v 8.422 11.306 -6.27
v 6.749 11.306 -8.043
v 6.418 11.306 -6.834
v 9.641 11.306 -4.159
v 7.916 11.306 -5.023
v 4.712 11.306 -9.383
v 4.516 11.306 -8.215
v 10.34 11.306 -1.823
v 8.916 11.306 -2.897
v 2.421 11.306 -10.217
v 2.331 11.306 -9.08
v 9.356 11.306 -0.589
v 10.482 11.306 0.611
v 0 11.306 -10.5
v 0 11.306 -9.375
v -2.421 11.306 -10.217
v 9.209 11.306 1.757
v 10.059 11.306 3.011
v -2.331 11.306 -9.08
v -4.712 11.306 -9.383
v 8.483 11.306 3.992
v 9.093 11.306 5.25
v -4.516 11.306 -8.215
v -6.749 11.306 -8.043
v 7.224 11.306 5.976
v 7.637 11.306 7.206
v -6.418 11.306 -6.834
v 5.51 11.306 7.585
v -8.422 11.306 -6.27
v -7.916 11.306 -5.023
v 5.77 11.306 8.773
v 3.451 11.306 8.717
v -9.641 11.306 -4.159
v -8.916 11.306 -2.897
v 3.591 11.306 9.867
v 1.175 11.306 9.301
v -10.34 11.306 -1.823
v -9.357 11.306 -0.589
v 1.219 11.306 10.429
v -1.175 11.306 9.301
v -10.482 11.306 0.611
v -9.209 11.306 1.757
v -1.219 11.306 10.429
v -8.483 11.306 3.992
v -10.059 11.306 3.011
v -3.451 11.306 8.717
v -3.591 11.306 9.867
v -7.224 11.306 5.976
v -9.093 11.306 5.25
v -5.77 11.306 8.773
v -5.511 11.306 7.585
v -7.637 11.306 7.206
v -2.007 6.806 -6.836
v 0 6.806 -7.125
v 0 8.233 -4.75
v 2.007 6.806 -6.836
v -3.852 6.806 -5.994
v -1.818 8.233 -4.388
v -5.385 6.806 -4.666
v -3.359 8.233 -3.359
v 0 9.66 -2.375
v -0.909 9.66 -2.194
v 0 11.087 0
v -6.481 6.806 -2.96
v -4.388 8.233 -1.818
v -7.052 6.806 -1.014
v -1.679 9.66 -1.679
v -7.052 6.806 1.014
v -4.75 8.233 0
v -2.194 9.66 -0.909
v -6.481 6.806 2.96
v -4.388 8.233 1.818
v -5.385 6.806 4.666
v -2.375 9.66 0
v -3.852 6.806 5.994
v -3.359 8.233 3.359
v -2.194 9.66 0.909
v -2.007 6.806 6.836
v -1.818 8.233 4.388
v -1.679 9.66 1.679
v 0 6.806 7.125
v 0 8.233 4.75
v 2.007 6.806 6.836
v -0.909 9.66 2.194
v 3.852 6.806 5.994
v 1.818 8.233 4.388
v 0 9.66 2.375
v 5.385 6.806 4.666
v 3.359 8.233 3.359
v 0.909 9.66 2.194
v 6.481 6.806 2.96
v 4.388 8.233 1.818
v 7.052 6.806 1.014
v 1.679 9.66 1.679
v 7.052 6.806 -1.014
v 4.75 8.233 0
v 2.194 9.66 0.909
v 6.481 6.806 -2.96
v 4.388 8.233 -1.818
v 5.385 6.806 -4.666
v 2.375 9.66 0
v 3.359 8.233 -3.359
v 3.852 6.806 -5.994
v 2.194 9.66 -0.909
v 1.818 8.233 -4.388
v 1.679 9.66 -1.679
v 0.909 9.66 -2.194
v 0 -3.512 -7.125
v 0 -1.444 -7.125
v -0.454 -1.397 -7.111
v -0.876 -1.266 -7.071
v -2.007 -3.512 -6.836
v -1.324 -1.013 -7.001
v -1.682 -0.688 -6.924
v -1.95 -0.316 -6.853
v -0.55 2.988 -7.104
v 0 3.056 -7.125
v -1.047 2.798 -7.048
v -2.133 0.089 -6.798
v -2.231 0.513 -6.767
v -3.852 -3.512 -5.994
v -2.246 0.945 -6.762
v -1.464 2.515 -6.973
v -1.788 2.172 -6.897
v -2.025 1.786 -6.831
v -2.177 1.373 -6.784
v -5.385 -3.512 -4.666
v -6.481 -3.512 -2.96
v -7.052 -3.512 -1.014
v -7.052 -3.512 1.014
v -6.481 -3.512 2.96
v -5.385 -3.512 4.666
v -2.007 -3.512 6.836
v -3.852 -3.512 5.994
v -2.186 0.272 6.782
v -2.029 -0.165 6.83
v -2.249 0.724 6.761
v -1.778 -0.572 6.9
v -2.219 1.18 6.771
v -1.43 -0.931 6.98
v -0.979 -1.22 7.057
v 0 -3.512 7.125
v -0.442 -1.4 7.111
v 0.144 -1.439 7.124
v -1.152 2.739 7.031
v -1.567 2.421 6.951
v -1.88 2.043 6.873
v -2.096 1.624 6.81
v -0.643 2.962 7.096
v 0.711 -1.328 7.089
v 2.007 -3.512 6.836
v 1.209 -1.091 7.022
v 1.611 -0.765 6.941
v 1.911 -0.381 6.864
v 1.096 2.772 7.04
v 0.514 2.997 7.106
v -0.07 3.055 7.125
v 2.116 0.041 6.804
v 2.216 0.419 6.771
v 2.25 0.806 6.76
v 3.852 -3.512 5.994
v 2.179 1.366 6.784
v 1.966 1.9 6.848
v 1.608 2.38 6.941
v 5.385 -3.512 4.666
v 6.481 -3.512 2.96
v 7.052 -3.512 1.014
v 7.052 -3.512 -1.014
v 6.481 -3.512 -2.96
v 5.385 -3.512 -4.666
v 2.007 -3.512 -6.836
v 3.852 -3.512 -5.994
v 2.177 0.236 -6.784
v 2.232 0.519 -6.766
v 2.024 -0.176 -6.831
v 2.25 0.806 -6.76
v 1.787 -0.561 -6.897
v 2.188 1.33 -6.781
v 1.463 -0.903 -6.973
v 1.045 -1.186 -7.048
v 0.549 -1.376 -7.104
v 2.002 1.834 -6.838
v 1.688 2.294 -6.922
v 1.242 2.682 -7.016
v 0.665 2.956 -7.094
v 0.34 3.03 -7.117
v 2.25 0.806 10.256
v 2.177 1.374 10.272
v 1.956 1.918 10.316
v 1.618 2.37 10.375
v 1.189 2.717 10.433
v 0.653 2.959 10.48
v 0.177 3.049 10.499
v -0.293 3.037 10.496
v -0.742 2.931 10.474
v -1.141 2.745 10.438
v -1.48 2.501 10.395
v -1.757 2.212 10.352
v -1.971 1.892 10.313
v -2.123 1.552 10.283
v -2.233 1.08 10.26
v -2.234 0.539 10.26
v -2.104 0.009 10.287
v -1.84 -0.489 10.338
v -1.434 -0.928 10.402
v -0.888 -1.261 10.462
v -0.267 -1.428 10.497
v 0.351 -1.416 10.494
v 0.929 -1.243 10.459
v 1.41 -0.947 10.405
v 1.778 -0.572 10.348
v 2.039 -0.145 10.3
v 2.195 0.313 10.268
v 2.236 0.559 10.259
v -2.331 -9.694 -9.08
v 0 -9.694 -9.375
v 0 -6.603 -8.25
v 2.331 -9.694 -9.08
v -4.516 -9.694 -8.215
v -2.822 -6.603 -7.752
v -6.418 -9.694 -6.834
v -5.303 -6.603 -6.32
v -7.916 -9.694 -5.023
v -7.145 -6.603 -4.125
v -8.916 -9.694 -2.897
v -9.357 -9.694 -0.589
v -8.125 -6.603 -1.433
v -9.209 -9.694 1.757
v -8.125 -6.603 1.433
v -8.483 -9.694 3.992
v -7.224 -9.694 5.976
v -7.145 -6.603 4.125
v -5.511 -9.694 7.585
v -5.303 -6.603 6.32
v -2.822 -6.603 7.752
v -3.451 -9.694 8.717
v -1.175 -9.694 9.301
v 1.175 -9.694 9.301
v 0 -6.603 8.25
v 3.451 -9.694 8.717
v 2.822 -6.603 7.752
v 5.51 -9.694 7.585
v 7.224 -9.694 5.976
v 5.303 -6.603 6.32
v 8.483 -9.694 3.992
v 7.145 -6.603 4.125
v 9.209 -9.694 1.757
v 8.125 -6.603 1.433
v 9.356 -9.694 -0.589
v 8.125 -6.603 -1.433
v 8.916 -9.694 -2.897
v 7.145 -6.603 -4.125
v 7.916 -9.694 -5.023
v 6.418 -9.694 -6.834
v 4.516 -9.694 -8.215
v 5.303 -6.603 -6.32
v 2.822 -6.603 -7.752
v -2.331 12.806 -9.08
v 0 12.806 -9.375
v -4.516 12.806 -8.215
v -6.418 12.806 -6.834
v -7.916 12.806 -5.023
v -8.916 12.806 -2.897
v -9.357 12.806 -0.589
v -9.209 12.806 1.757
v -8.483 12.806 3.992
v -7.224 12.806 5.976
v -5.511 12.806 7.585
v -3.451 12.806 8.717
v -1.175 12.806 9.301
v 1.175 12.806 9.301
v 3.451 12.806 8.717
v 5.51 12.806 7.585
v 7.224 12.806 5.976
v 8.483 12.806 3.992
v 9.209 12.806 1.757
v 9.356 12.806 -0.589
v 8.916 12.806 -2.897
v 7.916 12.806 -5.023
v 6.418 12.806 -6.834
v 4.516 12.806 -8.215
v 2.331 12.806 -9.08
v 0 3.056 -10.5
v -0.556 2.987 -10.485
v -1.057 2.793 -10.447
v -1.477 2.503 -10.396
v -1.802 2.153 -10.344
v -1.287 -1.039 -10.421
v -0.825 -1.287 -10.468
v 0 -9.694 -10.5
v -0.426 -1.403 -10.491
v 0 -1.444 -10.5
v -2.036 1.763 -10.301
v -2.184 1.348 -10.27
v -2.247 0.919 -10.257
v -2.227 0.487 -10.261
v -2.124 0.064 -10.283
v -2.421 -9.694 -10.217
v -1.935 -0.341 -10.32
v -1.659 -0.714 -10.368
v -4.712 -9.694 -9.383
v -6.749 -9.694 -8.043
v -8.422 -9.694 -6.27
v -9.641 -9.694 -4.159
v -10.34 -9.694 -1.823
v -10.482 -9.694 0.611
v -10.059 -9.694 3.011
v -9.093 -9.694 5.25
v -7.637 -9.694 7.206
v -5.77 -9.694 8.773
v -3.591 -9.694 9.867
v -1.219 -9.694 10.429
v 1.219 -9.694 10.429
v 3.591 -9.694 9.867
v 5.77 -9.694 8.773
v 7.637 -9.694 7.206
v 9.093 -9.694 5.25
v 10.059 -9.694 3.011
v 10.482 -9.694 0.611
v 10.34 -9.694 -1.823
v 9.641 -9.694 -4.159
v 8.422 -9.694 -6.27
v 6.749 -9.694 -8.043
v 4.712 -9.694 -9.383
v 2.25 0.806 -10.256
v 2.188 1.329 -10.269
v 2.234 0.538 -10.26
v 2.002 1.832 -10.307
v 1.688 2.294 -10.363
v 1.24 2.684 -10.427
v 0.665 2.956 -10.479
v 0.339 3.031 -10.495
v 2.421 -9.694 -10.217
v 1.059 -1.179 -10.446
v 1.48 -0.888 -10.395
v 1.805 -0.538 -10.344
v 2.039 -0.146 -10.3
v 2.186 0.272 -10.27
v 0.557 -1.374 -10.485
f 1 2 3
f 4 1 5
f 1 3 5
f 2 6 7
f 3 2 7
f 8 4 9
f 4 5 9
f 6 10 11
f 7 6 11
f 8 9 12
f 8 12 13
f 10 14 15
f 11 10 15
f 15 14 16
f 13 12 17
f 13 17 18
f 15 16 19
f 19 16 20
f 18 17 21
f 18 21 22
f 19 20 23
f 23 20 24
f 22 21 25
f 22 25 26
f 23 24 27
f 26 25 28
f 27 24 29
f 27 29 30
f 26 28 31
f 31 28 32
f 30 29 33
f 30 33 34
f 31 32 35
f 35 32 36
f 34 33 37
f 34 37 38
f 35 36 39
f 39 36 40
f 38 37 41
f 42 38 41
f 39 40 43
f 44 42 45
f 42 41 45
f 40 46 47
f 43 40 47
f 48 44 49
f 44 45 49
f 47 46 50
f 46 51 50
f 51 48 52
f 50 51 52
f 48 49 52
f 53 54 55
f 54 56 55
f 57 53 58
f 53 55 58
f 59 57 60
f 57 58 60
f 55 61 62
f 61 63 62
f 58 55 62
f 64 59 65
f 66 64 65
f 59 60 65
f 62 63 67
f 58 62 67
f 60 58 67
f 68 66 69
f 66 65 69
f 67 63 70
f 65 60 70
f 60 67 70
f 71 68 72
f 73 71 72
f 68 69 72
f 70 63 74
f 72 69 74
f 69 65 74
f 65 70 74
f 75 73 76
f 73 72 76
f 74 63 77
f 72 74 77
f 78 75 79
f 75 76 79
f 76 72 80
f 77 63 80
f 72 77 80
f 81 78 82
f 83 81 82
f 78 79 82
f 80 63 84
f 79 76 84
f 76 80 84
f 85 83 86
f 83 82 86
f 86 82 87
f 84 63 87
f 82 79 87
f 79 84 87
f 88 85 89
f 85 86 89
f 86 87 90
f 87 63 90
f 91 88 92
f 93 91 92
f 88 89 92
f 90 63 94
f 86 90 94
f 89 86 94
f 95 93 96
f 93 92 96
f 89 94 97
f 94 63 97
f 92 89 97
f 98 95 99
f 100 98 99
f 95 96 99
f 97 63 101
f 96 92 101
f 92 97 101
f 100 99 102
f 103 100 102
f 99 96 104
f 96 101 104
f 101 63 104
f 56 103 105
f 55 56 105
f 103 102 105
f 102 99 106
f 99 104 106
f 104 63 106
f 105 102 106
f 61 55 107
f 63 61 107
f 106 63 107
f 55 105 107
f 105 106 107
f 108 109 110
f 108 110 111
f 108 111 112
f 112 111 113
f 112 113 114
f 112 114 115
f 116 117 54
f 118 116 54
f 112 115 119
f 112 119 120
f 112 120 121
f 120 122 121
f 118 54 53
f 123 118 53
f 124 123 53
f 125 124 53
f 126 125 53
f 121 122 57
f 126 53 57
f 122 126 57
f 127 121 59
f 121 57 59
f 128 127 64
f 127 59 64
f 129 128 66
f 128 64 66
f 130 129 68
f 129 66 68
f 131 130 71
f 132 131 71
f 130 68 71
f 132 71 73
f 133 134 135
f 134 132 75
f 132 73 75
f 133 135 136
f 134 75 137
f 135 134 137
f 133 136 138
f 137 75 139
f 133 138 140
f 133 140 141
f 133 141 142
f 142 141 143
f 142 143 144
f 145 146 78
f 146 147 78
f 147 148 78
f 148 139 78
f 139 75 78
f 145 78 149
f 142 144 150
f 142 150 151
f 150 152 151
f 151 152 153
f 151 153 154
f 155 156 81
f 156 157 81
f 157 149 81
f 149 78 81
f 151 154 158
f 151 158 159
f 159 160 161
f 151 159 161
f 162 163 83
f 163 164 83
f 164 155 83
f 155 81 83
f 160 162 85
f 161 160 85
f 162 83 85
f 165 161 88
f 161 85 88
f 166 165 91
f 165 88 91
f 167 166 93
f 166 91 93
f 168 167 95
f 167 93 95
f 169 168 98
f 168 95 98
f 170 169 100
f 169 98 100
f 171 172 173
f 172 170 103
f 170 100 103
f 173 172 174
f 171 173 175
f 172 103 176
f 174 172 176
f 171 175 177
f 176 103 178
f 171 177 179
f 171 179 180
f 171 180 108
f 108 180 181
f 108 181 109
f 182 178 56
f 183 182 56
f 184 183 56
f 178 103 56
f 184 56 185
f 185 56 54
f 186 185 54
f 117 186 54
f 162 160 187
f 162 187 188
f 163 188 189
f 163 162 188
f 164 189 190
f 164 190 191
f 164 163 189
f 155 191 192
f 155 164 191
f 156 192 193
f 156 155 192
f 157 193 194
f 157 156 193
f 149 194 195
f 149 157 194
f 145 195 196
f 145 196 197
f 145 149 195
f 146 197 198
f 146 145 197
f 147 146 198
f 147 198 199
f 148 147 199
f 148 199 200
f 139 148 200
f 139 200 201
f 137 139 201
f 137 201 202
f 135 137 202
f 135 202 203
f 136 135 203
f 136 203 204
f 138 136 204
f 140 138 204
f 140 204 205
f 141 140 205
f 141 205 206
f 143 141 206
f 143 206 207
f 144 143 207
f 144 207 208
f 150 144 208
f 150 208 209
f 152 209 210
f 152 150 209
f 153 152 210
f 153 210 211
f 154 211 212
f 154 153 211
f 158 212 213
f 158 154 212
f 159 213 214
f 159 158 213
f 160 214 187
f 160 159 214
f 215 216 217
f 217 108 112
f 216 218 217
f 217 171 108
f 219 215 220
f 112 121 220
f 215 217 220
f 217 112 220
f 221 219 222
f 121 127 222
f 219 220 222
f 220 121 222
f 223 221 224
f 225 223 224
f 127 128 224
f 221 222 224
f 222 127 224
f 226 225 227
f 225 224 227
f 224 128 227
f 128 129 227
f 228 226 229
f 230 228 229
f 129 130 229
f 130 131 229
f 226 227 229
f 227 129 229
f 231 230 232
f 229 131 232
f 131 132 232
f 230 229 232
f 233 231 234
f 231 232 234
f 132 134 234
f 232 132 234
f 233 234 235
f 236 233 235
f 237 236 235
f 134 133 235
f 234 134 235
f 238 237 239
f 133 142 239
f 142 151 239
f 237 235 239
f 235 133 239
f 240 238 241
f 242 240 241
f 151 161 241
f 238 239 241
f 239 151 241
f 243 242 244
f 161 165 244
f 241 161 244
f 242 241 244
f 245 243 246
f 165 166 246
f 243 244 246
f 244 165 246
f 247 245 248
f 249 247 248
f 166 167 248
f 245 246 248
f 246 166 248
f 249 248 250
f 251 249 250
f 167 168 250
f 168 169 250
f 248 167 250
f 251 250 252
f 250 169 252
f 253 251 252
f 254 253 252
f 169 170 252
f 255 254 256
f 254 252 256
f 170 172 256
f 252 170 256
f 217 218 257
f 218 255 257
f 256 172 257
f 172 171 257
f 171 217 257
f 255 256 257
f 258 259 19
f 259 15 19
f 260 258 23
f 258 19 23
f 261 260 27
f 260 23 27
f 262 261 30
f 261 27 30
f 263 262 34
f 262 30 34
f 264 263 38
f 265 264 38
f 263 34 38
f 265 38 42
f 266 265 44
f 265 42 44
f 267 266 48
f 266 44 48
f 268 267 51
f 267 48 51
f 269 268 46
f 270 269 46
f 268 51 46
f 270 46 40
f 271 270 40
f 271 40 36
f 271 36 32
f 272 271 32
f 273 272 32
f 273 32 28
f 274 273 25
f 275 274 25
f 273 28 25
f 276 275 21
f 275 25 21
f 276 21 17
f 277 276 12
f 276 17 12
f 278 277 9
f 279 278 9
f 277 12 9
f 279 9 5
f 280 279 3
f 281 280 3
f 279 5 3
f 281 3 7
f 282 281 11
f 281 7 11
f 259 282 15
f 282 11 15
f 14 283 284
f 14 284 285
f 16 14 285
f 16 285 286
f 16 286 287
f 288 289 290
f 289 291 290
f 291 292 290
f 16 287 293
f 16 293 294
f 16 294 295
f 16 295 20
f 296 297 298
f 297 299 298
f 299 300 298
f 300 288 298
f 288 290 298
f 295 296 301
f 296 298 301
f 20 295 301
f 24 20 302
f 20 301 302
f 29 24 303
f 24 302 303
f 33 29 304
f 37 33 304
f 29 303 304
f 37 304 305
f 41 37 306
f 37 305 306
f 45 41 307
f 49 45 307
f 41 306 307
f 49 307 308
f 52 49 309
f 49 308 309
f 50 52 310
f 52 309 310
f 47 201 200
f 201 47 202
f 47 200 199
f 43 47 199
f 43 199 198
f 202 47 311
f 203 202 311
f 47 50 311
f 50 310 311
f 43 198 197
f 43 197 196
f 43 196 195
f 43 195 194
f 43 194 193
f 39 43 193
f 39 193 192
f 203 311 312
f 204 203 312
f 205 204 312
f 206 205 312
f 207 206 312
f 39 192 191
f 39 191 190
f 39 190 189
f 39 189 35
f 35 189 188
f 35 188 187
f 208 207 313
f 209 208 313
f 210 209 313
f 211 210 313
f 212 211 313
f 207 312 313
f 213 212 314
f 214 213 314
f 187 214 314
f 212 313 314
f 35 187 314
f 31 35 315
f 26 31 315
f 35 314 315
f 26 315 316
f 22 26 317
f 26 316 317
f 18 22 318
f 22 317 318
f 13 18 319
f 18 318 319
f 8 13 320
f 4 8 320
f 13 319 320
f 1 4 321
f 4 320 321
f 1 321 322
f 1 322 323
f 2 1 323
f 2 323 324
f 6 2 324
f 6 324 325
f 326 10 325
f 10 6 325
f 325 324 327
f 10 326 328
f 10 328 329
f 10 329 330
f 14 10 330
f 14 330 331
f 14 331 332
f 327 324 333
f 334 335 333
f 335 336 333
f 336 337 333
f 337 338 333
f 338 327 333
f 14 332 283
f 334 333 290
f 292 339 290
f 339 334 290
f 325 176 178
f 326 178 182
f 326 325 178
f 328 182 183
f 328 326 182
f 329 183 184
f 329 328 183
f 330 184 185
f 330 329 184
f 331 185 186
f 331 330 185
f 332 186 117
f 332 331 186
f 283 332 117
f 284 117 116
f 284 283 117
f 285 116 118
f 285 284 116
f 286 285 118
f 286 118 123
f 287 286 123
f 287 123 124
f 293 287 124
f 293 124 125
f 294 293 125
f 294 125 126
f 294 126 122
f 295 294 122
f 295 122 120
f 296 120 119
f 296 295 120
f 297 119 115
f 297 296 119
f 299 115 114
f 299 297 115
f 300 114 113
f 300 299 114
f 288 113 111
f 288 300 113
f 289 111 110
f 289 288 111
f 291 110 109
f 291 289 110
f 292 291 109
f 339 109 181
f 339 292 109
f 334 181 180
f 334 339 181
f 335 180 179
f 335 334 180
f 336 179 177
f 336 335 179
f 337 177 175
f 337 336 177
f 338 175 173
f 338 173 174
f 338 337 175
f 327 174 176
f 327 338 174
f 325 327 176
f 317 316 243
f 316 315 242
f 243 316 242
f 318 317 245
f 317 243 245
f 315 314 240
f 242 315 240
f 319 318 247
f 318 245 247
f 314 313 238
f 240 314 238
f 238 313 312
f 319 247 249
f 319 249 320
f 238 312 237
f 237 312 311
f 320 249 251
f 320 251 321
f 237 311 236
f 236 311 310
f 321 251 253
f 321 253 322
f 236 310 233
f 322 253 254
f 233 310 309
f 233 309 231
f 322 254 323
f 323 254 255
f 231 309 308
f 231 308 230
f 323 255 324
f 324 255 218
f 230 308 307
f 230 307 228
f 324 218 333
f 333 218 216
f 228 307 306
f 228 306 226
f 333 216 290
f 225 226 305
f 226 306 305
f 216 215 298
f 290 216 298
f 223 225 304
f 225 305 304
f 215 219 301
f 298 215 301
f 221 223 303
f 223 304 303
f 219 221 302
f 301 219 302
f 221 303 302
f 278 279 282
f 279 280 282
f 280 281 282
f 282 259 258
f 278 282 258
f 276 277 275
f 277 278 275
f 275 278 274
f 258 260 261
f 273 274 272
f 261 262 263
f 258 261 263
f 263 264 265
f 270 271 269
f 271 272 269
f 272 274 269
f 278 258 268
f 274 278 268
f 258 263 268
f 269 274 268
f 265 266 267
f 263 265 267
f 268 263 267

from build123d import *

# Parameters (mm, degrees)
CUT_EXTRUDE1_DEPTH      = 14.868123463
CUT_EXTRUDE1_DEPTH_BACK = 14.868123463
SKETCH2_R               = 1.5
SCALE1_SCALE            = 1.5


with BuildPart() as part:
    # Sketch1 → Revolve1 (revolve)
    with BuildSketch(Plane.XY, mode=Mode.PRIVATE) as revolve1_sk:
        Polygon((0, 9.712098042), (-6.25, 9.712098042), (-6.25, 8.712098042), (-7, 8.712098042), (-7, -5.287901958), (-6.25, -5.287901958), (-4.75, -1.166685828), (-4.75, 5.712098042), (0, 8.566185983), align=None)
    revolve(revolve1_sk.sketch.rotate(Axis((0, 2.420801252, 0), (0, 1, 0)), 270), axis=Axis((0, 2.420801252, 0), (0, 1, 0)))

    # Sketch2 → Cut-Extrude1 (cut, two sides: drawn at the far end of the back side and taken through both)
    with BuildSketch(Plane.XY.offset(-CUT_EXTRUDE1_DEPTH_BACK)):
        with Locations((0, 1.712098042)):
            Circle(SKETCH2_R)
    extrude(amount=CUT_EXTRUDE1_DEPTH + CUT_EXTRUDE1_DEPTH_BACK, mode=Mode.SUBTRACT)


with BuildPart() as part_1:
    # Scale1: scaled about (3.5175e-05, 3.523748347, -7.815e-06)
    add(part.part.scale(SCALE1_SCALE).moved(Location((-1.7588e-05, -1.761874174, 3.908e-06))))


solid = part_1.part
